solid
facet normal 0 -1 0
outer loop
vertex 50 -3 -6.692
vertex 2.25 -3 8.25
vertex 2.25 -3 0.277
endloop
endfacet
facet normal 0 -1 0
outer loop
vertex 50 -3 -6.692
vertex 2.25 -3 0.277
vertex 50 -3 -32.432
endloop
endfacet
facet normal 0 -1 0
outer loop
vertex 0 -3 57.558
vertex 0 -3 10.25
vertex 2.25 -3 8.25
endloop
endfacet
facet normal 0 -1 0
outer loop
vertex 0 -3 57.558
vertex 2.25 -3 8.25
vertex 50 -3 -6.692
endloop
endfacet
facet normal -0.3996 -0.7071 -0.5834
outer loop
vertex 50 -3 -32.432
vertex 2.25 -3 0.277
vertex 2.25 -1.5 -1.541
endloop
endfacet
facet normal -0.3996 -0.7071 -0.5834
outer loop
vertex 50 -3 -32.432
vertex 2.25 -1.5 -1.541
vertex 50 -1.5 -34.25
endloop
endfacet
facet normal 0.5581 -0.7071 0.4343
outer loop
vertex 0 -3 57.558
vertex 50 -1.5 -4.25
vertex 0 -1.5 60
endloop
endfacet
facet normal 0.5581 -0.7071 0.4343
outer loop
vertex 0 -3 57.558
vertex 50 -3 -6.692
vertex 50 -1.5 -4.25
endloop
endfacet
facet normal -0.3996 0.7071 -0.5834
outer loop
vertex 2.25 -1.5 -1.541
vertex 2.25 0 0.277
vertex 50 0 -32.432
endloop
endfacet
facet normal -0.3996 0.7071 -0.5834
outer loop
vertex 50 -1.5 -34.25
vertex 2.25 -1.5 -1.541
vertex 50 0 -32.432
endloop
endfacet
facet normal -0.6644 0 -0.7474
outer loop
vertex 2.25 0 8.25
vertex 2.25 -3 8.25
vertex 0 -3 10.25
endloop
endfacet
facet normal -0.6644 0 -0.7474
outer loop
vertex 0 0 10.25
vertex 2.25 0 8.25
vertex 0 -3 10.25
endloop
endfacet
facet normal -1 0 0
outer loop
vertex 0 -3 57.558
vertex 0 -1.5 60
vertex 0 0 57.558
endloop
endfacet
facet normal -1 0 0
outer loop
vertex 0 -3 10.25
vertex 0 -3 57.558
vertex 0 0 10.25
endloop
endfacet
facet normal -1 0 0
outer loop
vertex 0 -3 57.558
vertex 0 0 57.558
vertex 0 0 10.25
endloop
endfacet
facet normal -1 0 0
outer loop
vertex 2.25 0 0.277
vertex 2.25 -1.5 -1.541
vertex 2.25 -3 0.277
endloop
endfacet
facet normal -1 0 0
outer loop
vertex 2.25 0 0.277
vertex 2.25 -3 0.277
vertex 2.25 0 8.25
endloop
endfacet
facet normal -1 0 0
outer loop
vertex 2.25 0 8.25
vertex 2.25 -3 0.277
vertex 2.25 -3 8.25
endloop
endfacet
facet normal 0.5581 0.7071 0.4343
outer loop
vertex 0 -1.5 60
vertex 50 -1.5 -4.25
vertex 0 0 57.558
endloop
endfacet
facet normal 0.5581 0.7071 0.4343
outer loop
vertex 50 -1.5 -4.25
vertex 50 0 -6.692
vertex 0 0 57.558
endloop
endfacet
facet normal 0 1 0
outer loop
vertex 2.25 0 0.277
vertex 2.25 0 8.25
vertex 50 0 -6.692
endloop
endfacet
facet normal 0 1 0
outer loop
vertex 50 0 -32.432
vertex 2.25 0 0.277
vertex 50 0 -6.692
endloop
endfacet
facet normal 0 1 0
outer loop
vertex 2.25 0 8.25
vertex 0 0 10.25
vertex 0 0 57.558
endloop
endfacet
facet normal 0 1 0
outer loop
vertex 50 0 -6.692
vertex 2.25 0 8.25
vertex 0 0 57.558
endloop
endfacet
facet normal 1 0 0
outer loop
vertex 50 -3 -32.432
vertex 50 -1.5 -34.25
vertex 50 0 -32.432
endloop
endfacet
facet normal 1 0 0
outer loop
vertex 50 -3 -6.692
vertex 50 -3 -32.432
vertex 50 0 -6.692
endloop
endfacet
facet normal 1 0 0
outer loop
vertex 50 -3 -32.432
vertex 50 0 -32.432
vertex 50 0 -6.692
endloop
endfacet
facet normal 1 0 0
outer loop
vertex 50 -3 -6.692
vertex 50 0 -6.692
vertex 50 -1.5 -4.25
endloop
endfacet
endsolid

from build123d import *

# Parameters (mm, degrees)
F1_DEPTH = 3
F2_SIZE  = 1.49999
F4_DEPTH = 4


# Not quite as in the source:
# - a fillet or chamfer is up to 0.001 mm smaller than in the source, because OpenCascade refuses the exact size


with BuildPart() as f1:
    # F0 (on Front) → F1 (new body)
    with BuildSketch(Plane.XZ):
        Polygon((0, 60), (0, 0), (50, -34.25), (50, -4.25), align=None)
    extrude(amount=F1_DEPTH)

    # F2 (size 1.5 in the source; OpenCascade refuses exactly that, so slightly less here)
    f2_edges = [f1.edges().sort_by_distance(p)[0] for p in [
        (25, -3, 27.875),
        (25, 0, 27.875),
        (25, -3, -17.125),
        (25, 0, -17.125),
    ]]
    chamfer(f2_edges, length=F2_SIZE)

    # F3 (on Front) → F4 (cut, symmetric)
    with BuildSketch(Plane.XZ):
        Polygon((2.25, 8.25), (0, 10.25), (0, -5), (2.25, -5), align=None)
    extrude(amount=F4_DEPTH, both=True, mode=Mode.SUBTRACT)


solid = f1.part
